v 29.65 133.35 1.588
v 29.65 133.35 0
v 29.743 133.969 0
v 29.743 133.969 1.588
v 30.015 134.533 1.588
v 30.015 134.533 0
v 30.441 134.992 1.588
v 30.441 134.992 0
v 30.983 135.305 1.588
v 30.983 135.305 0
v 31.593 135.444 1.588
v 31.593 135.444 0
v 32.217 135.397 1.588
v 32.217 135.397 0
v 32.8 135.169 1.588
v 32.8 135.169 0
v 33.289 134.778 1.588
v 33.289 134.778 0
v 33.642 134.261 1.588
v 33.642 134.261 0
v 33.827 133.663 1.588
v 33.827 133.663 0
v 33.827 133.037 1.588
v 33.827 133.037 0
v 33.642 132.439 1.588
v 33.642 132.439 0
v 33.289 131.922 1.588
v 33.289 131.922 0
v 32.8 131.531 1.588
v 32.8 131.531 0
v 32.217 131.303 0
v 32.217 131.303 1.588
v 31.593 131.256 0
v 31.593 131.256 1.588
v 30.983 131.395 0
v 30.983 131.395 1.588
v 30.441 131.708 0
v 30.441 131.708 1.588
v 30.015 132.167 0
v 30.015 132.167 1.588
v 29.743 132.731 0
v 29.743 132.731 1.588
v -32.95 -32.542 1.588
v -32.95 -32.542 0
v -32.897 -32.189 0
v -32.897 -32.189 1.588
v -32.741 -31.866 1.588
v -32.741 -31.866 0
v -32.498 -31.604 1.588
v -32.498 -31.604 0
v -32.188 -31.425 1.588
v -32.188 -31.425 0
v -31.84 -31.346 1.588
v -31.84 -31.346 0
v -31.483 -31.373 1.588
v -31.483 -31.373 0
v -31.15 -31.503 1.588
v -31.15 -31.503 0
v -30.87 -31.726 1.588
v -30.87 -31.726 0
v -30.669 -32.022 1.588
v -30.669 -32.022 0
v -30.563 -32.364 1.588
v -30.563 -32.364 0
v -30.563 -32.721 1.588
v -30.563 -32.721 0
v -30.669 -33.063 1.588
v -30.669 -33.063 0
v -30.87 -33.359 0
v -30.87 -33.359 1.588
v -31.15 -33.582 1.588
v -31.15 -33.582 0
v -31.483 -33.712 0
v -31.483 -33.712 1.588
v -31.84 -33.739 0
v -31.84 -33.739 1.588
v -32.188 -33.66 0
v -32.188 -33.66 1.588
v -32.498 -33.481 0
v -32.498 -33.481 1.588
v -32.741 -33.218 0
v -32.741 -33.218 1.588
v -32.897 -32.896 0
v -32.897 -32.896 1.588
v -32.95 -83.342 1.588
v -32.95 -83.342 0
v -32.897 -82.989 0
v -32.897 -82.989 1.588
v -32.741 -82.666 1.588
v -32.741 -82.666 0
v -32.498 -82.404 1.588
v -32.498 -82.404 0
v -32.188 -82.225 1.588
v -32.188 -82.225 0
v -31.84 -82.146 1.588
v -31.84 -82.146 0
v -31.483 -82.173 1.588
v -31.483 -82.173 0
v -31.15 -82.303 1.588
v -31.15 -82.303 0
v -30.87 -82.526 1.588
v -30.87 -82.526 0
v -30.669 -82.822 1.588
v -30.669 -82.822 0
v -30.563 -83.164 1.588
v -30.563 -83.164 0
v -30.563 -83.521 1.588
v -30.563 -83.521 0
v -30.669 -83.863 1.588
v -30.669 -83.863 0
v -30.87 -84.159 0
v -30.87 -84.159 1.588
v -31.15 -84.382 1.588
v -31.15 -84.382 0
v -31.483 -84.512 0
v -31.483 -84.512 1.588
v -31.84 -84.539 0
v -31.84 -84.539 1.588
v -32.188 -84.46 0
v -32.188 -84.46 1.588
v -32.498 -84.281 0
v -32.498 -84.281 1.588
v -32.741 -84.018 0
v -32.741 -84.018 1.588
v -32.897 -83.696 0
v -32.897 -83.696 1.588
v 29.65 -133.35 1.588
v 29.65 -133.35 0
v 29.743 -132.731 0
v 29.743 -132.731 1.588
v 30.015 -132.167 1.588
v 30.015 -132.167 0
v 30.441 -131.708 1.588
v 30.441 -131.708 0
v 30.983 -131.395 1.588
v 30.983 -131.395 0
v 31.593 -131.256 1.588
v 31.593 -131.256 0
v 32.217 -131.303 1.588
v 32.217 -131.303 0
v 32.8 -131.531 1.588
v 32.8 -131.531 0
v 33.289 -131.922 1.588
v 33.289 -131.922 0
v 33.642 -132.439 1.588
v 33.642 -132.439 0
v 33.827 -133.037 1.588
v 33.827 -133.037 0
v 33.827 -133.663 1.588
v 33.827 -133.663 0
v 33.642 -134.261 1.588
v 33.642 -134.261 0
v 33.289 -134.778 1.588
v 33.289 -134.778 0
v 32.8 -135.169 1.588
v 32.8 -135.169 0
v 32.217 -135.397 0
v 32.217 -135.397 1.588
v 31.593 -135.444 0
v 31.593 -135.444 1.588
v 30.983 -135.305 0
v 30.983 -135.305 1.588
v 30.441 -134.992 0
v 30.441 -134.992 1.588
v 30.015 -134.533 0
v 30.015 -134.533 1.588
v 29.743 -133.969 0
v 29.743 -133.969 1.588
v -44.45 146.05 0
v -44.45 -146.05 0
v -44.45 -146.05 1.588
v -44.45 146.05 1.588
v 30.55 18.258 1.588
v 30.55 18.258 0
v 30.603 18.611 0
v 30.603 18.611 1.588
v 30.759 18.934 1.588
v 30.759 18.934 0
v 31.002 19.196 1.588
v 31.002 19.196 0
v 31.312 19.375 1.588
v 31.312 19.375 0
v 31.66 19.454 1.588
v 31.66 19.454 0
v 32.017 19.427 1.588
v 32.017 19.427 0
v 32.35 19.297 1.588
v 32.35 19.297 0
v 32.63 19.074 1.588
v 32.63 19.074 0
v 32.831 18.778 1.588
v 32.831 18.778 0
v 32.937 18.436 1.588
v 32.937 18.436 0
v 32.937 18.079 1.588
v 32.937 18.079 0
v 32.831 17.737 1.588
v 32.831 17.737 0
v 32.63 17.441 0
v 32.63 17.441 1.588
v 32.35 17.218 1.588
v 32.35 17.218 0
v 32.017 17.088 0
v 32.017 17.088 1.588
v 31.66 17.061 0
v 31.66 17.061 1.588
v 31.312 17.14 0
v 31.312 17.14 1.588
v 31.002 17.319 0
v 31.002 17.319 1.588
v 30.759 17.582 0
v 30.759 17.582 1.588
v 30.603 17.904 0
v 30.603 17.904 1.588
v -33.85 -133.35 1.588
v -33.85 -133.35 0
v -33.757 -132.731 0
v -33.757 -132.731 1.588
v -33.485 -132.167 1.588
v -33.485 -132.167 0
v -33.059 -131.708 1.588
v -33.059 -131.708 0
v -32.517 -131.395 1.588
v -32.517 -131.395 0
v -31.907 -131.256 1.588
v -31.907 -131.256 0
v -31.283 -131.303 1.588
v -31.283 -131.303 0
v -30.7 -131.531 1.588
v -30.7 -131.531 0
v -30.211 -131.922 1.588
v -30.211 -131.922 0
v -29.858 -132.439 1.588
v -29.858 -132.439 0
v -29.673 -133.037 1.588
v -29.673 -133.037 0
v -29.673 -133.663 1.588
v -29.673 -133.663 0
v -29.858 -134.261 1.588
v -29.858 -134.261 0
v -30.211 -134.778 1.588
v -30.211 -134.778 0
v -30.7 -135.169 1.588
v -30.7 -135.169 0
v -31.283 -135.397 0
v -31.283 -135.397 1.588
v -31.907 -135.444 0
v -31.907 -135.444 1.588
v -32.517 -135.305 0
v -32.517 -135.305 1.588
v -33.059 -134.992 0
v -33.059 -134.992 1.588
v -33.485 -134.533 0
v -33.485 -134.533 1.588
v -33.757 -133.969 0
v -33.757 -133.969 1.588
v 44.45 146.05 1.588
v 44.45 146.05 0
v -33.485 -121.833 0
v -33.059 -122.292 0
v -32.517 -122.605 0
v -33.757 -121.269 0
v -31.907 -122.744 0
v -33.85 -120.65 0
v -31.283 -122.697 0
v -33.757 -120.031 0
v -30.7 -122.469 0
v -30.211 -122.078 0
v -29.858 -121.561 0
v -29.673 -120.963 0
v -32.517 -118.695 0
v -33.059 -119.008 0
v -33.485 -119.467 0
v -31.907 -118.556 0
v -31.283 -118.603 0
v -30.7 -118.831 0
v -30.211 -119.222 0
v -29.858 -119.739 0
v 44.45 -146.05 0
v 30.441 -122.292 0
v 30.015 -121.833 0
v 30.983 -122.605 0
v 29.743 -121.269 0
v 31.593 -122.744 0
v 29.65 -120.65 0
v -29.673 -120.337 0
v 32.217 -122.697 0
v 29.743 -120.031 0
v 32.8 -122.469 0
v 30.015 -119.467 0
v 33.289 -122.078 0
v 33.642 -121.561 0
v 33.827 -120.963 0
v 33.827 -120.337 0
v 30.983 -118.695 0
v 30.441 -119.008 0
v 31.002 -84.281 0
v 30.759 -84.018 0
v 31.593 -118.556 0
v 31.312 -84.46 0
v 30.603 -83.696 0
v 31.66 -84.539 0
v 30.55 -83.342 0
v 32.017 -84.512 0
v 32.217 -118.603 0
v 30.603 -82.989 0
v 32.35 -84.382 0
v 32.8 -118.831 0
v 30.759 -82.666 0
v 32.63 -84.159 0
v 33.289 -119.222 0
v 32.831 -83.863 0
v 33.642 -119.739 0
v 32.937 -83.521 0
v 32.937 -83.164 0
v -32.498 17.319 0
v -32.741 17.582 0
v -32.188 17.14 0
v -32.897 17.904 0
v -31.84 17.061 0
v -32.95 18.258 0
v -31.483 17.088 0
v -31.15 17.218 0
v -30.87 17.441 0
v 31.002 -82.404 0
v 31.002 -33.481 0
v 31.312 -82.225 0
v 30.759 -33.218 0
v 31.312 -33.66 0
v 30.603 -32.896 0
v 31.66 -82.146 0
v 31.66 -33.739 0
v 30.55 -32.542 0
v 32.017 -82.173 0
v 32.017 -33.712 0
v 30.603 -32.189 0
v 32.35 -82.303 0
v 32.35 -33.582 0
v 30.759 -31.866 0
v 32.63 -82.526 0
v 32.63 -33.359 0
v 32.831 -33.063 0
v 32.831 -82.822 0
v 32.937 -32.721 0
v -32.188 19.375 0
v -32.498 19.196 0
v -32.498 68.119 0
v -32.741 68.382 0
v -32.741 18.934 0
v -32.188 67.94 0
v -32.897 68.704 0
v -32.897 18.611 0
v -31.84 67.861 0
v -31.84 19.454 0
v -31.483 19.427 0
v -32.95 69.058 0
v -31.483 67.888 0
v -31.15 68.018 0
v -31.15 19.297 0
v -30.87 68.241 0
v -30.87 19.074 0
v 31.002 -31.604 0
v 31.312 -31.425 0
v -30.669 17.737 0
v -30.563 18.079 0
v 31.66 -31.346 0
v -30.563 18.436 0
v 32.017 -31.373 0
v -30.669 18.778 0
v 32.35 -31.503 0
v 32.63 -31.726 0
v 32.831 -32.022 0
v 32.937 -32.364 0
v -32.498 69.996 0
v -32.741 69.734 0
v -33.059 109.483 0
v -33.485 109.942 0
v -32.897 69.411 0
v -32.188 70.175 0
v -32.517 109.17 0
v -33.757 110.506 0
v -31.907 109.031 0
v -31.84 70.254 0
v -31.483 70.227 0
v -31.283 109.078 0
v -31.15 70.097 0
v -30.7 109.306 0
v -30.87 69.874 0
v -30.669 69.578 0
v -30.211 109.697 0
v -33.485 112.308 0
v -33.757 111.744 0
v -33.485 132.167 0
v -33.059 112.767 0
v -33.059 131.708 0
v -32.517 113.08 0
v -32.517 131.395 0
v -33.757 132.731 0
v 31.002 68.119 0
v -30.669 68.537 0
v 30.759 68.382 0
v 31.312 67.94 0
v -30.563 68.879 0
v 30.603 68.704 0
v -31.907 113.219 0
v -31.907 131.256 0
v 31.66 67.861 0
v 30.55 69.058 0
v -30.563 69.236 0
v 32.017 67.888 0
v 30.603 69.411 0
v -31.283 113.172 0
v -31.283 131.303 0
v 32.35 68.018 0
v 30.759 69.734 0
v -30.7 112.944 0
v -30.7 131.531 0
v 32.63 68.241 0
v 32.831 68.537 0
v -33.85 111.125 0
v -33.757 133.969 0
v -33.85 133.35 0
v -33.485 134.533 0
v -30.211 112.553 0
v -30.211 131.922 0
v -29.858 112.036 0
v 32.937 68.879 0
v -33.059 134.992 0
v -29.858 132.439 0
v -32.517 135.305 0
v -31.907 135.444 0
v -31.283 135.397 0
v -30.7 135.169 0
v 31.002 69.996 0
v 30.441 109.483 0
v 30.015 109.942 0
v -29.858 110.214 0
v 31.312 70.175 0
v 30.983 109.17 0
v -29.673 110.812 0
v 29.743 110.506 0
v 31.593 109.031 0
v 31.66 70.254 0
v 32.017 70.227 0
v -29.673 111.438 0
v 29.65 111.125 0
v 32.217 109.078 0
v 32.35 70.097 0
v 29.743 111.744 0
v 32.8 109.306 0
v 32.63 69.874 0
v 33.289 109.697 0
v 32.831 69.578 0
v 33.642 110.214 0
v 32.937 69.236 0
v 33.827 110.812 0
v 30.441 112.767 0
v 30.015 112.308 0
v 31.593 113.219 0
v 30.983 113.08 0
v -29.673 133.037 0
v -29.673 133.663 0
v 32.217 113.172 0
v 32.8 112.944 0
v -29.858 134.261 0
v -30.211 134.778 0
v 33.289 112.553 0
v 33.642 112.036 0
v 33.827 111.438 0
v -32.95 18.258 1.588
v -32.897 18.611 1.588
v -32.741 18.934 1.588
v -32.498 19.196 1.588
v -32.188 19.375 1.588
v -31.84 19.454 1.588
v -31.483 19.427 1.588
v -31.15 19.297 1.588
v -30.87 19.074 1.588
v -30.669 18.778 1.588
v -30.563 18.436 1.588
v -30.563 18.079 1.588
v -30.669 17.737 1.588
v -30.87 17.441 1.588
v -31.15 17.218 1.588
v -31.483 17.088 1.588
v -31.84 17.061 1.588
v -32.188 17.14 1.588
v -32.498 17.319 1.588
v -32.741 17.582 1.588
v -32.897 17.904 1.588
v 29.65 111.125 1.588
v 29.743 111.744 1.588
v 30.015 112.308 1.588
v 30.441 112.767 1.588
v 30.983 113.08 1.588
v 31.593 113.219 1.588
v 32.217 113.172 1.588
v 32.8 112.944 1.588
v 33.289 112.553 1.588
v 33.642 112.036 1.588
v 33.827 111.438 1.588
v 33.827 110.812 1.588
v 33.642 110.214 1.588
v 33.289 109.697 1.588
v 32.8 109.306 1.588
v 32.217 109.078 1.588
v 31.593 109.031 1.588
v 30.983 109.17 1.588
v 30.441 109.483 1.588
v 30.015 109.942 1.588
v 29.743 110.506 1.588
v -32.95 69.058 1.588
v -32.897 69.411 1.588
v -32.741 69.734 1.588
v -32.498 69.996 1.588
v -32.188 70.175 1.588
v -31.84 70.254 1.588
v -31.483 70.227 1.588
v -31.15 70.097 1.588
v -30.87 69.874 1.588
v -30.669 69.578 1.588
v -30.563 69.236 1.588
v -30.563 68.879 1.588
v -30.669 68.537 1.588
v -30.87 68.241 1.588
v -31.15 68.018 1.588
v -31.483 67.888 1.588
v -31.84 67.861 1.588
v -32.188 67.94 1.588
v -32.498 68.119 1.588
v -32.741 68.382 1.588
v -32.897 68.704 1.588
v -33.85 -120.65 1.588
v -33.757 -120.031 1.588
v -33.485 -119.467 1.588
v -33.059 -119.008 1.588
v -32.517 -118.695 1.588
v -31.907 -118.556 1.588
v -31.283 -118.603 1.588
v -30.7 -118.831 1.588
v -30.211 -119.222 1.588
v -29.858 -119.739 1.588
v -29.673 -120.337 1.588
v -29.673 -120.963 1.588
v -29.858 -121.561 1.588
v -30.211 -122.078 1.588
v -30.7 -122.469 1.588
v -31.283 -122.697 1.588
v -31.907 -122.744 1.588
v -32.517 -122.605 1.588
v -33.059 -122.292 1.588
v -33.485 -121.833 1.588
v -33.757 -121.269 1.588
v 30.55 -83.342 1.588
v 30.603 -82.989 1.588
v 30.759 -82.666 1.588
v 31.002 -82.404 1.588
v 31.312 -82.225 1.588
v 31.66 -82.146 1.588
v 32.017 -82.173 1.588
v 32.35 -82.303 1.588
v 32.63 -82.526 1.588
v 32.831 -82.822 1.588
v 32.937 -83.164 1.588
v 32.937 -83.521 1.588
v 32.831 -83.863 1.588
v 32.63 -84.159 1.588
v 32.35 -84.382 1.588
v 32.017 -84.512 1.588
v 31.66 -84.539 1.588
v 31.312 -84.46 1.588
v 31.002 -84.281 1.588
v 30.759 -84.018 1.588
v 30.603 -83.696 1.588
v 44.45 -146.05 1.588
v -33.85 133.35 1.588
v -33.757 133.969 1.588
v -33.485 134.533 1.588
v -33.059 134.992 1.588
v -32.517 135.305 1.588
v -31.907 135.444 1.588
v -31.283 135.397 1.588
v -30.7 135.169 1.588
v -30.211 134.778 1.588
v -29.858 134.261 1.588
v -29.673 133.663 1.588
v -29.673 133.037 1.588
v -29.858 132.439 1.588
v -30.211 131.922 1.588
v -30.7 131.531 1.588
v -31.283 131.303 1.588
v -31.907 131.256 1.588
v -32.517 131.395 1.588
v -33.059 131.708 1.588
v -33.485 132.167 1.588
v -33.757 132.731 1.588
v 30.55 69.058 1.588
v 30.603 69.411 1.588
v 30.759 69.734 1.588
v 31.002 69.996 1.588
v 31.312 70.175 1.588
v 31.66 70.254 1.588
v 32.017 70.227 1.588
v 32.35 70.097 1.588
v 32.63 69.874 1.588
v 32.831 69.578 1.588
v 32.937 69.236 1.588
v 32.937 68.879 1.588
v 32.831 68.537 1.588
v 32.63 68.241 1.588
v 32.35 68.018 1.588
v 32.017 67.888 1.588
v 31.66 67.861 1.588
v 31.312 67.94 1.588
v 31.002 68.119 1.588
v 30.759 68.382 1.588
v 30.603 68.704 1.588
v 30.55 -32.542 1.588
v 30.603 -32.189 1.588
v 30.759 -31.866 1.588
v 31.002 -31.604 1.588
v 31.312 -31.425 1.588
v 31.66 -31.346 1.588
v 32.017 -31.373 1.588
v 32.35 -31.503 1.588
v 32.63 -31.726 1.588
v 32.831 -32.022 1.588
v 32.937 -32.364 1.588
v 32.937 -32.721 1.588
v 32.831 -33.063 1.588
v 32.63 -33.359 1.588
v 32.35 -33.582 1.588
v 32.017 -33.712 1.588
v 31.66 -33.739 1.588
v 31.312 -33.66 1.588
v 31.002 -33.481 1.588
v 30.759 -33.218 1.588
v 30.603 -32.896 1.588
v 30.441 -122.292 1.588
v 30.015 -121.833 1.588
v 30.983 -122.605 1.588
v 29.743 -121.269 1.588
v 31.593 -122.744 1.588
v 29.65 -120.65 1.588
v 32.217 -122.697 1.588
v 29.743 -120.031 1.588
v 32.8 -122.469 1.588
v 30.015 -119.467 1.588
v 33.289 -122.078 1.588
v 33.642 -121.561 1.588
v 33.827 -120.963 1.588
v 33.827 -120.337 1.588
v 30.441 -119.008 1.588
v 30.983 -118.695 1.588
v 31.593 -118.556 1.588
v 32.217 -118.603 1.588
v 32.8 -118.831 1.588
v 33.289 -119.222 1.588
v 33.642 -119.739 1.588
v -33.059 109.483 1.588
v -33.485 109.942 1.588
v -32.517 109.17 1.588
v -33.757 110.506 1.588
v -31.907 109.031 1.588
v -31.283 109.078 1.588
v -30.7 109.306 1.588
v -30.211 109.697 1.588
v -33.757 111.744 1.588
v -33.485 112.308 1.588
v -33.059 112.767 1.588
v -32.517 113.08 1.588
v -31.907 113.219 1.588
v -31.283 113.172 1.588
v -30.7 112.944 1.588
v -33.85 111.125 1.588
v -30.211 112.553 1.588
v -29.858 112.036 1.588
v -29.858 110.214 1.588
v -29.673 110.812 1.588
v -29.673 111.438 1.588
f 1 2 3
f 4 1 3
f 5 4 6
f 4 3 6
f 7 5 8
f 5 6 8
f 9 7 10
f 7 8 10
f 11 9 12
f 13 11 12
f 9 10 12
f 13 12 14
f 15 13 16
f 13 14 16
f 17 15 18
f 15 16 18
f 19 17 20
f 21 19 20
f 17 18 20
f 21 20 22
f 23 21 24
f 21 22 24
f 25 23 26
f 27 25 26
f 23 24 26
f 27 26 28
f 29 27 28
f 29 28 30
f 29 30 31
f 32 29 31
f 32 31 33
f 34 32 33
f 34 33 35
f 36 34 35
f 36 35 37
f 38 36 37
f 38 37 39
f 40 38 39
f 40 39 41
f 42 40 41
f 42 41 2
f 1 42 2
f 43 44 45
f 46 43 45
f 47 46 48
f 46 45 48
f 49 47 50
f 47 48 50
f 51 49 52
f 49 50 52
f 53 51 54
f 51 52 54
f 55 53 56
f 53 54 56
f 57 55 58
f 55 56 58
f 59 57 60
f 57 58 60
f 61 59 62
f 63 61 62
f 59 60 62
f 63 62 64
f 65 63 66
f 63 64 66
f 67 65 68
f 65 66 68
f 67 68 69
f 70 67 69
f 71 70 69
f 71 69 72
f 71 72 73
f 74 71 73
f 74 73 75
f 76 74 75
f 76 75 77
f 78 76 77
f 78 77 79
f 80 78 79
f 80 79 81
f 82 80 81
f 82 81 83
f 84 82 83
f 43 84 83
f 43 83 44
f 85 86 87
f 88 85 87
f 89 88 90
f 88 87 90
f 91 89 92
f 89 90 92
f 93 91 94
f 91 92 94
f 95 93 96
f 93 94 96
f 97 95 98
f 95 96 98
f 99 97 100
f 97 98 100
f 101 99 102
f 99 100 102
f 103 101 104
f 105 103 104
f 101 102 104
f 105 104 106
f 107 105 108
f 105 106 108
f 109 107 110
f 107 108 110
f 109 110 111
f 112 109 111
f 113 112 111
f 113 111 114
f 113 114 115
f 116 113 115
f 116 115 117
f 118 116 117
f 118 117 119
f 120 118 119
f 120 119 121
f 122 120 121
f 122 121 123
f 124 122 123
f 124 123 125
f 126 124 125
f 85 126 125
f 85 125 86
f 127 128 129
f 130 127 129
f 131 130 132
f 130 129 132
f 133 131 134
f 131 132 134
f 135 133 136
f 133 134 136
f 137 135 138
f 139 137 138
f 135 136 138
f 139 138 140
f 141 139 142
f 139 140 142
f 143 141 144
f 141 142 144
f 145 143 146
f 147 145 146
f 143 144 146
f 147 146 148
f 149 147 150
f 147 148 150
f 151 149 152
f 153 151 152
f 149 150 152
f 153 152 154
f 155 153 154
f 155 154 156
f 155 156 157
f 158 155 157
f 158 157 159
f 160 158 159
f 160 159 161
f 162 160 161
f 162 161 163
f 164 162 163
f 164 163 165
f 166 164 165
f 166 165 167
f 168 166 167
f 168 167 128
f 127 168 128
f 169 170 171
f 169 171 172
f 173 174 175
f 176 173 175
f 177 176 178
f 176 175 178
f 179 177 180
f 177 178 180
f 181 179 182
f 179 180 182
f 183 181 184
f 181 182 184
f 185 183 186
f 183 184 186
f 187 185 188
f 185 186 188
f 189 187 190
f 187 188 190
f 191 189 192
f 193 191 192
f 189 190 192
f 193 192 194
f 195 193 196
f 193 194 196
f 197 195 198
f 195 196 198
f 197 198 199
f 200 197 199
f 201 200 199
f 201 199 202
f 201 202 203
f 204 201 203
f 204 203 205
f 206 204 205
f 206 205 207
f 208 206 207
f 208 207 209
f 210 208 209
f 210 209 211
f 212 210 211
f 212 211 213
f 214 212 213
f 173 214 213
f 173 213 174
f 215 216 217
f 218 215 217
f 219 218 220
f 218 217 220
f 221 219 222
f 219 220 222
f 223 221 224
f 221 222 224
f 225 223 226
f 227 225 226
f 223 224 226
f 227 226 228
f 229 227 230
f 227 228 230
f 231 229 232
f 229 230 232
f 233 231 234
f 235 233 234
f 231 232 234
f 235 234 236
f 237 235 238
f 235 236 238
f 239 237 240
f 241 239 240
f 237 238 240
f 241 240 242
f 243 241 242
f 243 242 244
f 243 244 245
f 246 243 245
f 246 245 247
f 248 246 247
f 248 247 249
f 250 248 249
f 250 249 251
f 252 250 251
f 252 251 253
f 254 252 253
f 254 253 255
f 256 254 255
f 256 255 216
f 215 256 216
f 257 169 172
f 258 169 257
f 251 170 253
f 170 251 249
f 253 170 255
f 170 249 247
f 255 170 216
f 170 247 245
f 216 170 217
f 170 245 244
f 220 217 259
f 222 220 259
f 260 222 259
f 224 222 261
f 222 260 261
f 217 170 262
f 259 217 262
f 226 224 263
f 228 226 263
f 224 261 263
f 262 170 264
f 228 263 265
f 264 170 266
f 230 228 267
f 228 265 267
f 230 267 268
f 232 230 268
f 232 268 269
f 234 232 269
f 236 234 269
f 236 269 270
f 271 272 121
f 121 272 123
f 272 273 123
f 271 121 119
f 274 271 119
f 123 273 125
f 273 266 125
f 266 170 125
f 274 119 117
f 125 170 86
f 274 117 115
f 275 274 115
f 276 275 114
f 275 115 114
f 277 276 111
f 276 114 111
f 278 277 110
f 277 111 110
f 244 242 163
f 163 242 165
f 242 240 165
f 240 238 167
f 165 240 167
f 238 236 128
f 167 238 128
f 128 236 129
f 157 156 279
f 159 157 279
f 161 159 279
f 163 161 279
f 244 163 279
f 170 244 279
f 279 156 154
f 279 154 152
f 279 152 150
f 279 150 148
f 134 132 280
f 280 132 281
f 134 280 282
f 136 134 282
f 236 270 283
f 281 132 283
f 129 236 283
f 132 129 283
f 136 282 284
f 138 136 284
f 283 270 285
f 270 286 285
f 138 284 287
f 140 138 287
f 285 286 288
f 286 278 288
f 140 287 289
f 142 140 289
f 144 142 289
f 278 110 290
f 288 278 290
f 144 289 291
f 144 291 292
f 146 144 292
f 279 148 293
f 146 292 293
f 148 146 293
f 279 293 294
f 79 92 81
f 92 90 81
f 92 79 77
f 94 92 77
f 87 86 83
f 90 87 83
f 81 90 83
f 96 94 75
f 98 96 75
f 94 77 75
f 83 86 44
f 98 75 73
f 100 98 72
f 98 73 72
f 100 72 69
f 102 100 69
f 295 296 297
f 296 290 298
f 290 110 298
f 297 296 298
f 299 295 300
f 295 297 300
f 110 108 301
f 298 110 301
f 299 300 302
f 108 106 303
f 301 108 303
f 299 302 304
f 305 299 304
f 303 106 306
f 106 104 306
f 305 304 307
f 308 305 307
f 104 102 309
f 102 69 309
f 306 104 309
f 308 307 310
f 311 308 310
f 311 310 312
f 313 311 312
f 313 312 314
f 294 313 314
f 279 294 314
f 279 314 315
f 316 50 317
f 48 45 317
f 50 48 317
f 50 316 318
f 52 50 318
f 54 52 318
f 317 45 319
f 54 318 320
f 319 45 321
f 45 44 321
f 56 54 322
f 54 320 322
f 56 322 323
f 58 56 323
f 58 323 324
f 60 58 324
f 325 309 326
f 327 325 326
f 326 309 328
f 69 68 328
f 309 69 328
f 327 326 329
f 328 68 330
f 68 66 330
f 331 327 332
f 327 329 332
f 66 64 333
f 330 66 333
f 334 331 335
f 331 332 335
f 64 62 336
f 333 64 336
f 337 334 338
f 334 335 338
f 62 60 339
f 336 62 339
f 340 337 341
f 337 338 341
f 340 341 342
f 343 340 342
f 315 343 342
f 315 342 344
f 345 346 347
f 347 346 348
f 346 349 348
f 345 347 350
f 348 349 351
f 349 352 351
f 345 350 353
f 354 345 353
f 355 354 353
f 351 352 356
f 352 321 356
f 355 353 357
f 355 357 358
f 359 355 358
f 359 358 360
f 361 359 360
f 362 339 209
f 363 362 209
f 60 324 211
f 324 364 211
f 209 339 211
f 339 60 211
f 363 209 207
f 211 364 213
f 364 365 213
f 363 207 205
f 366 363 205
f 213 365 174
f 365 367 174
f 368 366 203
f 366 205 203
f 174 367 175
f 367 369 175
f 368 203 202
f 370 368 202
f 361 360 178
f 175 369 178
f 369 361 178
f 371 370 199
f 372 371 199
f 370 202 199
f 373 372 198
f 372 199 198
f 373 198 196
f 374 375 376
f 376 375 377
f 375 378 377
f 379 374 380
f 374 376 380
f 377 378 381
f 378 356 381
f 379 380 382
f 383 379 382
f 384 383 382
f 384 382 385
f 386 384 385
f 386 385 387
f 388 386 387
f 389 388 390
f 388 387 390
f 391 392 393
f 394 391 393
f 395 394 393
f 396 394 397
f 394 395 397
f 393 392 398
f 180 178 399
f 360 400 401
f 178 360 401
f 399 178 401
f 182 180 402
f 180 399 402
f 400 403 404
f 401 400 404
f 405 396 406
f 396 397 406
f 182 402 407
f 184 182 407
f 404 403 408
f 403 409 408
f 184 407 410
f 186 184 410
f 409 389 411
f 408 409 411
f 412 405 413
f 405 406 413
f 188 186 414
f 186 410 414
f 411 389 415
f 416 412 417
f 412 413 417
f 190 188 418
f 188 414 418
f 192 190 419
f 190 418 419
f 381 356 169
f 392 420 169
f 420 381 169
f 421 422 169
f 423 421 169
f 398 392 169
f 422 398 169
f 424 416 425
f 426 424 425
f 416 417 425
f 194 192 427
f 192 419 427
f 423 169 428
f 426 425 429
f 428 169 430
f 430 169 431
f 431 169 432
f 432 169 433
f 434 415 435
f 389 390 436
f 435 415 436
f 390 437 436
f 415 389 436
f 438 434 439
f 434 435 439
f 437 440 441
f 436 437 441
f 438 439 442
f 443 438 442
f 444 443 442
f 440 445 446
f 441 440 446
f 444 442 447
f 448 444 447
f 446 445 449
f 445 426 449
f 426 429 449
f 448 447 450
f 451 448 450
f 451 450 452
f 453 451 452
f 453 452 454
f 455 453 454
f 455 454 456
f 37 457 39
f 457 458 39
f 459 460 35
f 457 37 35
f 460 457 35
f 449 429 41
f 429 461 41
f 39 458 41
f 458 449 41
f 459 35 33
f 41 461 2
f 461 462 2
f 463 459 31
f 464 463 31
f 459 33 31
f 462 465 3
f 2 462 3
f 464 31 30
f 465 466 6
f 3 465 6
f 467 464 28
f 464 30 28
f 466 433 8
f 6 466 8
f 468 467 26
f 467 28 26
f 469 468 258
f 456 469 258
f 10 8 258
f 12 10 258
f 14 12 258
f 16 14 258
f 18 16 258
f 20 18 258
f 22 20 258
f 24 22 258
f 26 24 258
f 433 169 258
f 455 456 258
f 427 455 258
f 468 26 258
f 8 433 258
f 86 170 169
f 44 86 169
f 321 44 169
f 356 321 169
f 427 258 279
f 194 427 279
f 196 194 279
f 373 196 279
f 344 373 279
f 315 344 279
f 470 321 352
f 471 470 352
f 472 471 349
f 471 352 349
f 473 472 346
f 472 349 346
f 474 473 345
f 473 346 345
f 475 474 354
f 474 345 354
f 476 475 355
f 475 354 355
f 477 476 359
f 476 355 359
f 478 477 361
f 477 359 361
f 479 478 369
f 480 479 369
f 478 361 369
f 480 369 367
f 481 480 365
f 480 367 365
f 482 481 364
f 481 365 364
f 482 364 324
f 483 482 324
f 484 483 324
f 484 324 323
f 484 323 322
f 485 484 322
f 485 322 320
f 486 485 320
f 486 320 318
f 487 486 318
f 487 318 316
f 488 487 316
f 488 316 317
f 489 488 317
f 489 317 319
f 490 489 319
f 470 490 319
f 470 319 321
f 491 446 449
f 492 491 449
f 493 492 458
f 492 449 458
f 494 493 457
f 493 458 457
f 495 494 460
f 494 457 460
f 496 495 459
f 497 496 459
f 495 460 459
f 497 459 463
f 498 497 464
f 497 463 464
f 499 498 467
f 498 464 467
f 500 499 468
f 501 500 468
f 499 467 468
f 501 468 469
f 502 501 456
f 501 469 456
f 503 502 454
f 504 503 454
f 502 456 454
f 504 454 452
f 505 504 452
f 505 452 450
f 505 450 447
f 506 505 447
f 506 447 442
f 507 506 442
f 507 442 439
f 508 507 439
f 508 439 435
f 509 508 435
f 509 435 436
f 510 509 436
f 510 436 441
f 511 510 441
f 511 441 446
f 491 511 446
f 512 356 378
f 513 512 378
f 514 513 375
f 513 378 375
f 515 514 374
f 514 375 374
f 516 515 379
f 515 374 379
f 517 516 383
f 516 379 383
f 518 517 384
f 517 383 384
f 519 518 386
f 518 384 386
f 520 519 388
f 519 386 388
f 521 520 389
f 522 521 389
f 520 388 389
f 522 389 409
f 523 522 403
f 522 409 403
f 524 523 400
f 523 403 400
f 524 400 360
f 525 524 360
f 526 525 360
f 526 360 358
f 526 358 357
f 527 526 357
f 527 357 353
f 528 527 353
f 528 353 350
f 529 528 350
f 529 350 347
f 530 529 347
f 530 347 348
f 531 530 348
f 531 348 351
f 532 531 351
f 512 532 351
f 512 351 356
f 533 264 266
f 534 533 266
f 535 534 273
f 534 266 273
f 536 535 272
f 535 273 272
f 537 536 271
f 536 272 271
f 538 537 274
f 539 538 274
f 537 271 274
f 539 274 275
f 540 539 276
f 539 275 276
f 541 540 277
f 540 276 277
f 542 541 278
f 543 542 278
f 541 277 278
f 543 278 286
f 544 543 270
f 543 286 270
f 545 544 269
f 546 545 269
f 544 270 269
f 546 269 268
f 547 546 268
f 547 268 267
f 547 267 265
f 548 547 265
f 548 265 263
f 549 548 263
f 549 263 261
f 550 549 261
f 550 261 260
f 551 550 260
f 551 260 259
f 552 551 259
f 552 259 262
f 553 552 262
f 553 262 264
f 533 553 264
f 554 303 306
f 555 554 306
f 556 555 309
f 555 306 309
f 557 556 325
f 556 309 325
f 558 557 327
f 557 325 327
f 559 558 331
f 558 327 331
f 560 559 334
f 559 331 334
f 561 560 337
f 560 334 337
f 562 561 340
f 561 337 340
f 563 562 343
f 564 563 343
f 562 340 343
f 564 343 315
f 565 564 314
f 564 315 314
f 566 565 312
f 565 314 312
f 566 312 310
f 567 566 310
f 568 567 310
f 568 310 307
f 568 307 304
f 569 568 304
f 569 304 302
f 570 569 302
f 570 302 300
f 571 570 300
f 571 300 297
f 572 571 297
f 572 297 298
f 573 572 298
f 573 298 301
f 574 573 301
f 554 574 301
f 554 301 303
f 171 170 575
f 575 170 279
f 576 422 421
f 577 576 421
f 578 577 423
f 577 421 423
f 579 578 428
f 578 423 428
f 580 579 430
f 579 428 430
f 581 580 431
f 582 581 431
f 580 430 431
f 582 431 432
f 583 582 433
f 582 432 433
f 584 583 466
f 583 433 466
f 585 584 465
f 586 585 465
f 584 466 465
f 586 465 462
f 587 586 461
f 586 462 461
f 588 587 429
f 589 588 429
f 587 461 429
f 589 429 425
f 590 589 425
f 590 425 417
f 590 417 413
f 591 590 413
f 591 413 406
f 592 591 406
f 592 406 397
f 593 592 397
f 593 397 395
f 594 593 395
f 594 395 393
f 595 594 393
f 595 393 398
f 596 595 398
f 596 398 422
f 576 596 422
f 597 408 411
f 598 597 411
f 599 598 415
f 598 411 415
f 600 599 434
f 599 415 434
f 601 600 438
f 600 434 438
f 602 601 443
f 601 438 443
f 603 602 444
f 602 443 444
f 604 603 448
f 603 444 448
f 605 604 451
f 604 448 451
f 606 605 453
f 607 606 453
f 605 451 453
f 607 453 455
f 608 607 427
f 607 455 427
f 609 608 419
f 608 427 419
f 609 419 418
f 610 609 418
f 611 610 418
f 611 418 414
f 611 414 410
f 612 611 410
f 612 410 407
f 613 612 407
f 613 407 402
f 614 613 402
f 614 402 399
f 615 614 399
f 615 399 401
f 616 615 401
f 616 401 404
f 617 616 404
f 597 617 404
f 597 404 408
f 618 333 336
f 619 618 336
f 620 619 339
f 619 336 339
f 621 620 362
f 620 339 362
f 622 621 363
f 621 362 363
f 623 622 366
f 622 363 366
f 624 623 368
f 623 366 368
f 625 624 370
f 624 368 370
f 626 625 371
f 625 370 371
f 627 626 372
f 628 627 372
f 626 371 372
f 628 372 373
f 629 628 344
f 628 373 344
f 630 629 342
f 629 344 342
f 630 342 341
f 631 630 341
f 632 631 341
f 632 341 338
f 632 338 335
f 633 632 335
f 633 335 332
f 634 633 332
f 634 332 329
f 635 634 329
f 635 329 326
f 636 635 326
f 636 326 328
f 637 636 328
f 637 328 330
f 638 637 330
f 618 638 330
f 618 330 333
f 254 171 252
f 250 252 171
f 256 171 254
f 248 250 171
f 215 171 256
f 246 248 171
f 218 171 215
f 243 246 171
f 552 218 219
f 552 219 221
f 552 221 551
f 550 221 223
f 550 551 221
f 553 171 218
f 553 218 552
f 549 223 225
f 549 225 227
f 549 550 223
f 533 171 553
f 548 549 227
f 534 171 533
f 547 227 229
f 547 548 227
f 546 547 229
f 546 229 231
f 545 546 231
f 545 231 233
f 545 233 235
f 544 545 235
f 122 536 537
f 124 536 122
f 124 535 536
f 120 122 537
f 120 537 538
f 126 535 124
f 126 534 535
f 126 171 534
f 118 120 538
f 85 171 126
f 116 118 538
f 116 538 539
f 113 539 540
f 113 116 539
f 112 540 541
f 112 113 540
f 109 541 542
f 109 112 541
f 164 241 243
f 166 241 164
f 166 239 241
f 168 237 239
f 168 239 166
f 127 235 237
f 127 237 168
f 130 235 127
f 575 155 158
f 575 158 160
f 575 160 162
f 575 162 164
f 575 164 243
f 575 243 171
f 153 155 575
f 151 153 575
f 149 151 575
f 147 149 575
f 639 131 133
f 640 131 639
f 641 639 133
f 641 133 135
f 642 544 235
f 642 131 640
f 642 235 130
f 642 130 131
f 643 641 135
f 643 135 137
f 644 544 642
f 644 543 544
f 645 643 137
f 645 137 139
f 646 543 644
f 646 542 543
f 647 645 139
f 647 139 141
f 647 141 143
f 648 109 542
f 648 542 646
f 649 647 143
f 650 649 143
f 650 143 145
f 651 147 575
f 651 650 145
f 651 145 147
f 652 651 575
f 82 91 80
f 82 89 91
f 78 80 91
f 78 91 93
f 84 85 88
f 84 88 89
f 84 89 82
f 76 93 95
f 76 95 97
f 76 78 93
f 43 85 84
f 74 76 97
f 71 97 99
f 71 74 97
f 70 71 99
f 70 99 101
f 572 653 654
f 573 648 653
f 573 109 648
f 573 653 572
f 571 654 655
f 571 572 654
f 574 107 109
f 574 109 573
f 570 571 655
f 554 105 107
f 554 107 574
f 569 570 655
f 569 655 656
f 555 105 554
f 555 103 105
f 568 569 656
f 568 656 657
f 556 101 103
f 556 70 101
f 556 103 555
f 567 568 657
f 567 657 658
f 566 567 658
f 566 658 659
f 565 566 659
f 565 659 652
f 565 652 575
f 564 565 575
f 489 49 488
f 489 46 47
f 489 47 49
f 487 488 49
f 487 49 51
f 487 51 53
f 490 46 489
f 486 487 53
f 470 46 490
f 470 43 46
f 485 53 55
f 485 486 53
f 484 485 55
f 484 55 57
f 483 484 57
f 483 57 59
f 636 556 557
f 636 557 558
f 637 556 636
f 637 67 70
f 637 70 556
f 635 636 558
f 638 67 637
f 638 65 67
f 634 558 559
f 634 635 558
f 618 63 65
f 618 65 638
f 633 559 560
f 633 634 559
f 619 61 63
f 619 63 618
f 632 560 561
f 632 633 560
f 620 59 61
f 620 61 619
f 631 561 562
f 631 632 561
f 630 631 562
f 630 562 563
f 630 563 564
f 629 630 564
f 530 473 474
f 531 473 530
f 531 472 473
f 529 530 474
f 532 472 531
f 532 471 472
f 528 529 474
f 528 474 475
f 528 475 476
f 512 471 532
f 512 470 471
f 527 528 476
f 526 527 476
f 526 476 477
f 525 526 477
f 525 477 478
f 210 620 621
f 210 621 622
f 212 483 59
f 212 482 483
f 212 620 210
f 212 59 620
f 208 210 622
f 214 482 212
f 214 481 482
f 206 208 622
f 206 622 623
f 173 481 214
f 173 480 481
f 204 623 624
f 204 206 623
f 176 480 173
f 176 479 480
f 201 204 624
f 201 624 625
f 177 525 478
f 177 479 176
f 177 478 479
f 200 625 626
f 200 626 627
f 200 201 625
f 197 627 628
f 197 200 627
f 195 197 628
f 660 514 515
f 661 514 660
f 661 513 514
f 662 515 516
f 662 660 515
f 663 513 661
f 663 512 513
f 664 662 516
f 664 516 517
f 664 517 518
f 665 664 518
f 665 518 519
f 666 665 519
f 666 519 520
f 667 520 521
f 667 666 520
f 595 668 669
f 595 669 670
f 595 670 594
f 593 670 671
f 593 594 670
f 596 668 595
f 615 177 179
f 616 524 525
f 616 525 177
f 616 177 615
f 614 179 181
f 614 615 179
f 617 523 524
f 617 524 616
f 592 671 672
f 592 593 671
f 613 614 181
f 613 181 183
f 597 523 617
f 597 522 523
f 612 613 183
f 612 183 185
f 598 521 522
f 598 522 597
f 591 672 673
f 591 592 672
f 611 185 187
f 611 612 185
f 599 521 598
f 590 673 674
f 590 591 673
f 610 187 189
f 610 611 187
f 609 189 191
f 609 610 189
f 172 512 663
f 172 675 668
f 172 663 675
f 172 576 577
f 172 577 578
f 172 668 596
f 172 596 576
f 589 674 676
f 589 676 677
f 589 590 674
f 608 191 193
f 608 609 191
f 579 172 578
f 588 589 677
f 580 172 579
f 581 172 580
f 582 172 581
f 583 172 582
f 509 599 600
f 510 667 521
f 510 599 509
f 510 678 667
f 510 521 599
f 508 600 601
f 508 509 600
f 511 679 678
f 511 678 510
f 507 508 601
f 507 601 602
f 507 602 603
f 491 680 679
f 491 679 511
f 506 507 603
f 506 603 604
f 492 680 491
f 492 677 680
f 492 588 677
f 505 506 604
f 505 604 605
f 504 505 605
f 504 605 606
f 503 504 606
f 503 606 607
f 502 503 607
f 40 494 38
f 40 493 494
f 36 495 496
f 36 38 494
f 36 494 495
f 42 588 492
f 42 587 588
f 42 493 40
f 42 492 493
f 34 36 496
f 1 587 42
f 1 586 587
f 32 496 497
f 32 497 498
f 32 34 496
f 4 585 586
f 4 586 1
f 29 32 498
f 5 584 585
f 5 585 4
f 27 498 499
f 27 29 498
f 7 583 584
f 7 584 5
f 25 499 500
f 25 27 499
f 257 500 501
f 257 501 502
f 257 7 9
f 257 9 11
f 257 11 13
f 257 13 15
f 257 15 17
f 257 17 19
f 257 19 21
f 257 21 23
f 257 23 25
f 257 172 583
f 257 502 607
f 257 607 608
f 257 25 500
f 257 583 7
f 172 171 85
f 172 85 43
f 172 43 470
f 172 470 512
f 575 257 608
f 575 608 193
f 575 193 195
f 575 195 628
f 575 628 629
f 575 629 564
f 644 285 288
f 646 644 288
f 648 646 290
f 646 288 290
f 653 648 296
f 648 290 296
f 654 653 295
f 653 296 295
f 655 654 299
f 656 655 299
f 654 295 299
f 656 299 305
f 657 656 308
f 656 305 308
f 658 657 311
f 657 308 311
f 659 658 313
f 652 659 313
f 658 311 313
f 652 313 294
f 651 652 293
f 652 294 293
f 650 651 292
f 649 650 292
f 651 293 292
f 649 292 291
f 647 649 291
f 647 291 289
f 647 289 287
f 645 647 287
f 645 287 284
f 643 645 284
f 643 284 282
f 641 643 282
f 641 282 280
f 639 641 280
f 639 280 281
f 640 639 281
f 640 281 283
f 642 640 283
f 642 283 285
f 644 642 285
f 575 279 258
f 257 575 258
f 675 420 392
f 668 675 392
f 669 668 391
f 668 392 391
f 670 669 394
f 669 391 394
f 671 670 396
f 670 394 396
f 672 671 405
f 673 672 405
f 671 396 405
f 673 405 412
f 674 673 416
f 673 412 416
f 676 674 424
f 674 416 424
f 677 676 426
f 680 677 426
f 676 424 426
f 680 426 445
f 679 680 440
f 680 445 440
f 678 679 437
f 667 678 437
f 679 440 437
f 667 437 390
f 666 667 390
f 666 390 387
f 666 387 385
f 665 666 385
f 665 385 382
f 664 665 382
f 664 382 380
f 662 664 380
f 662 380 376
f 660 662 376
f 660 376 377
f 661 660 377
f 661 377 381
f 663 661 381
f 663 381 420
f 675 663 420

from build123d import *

# Parameters (mm, degrees)
F0_W     = 88.9
F0_H     = 292.1
F1_DEPTH = 1.5875
F3_D     = 4.2
F3_DEPTH = 15.1
F3_TIP   = 1.2618073
F5_D     = 2.4
F5_DEPTH = 14.478
F5_TIP   = 0.7210327428


with BuildPart() as f1:
    # F0 (on Top) → F1 (new body)
    with BuildSketch(Plane.XY):
        Rectangle(F0_W, F0_H)
    extrude(amount=F1_DEPTH)

    # F3
    with Locations(Plane.XY.offset(1.5875)):
        with Locations((-31.75, 133.35), (-31.75, 111.125), (31.75, 111.125), (31.75, 133.35), (-31.75, -120.65), (-31.75, -133.35), (31.75, -133.35), (31.75, -120.65)):
            Hole(F3_D / 2, depth=F3_DEPTH)
            with Locations((0, 0, -(F3_DEPTH + F3_TIP / 2))):  # 118° drill point
                Cone(0, F3_D / 2, F3_TIP, mode=Mode.SUBTRACT)

    # F5
    with Locations(Plane.XY.offset(1.5875)):
        with Locations((-31.75, 69.05752), (31.75, 69.05752), (31.75, 18.25752), (-31.75, 18.25752), (-31.75, -32.54248), (31.75, -32.54248), (31.75, -83.34248), (-31.75, -83.34248)):
            Hole(F5_D / 2, depth=F5_DEPTH)
            with Locations((0, 0, -(F5_DEPTH + F5_TIP / 2))):  # 118° drill point
                Cone(0, F5_D / 2, F5_TIP, mode=Mode.SUBTRACT)


solid = f1.part
